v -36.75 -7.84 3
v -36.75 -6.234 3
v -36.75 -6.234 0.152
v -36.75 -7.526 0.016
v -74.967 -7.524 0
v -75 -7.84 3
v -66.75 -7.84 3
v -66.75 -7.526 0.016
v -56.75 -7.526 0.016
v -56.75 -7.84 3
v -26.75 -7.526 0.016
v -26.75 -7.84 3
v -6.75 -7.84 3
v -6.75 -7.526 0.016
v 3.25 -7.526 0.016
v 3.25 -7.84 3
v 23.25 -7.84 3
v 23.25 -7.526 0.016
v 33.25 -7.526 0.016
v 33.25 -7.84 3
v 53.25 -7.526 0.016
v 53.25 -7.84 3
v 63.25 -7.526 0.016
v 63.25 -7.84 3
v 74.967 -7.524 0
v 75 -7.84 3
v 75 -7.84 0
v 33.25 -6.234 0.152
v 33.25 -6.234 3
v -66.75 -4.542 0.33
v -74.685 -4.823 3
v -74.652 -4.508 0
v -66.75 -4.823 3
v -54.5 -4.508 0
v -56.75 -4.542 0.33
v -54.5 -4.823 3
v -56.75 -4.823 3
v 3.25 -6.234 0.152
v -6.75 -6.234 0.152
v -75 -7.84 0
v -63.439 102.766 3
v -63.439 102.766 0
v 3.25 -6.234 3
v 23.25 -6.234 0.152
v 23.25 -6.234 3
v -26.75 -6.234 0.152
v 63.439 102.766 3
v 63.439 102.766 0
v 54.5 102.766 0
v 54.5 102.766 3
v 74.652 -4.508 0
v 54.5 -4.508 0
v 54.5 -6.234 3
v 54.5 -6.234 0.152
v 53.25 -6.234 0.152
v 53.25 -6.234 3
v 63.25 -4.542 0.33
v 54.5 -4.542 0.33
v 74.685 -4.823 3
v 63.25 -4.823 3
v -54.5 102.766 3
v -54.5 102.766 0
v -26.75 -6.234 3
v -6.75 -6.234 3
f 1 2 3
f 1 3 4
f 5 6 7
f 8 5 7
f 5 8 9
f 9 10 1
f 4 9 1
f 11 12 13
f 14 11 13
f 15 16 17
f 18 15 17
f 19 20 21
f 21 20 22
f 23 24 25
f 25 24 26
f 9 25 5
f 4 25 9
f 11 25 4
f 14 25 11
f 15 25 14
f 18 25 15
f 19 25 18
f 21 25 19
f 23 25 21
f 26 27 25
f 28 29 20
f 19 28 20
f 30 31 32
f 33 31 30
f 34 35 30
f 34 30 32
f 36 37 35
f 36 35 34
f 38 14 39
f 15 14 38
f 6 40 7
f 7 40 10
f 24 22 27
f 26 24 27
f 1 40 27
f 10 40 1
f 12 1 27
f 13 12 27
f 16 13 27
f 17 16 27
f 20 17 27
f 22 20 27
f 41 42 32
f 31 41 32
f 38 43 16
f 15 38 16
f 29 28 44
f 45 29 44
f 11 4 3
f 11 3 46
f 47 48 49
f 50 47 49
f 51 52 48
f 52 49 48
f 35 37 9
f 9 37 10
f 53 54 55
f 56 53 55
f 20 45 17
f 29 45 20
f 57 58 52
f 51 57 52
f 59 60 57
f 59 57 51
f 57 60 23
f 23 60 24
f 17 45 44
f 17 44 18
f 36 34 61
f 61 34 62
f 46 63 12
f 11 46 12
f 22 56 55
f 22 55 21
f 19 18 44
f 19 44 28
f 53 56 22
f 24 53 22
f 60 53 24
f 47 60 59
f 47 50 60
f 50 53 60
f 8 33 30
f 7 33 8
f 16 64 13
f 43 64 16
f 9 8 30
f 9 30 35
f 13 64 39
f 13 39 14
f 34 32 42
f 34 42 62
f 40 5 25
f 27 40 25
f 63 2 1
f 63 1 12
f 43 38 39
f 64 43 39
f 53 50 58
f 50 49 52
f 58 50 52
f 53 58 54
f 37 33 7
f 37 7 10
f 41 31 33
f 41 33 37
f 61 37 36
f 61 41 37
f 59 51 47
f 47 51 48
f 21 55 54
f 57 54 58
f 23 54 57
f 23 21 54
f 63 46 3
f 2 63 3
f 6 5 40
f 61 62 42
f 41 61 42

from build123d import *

# Parameters (mm, degrees)
BOSS_EXTRUDE1_DEPTH = 3
CAVITY1_START       = -3.803030659
CAVITY1_OUTLINE_W   = 20
CAVITY1_OUTLINE_H   = 3
CAVITY1_OUTLINE_W_2 = 12.749963879
CAVITY1_OUTLINE_W_3 = 9.250036121
CAVITY1_DEPTH       = 3.331837545
CAVITY1_START_2     = -0.803030659
CAVITY1_2_OUTLINE_W = 10
CAVITY1_2_OUTLINE_H = 3
CAVITY1_2_DEPTH     = 0.331837545


# Read off the part's stored shape, not the designer's step: Cavity1
with BuildPart() as part:
    # Sketch3 → Boss-Extrude1 (new body)
    with BuildSketch(Plane.XY):
        Polygon((-63.438534121, 102.766276007), (-75, -7.839634745), (75, -7.839634745), (63.438534121, 102.766276007), (54.5, 102.766276007), (54.5, -6.233723993), (-54.5, -6.233723993), (-54.5, 102.766276007), align=None)
    extrude(amount=BOSS_EXTRUDE1_DEPTH)

    # Cavity1 outline → Cavity1 (cut)
    with BuildSketch(Plane(origin=(0, 0, 0), x_dir=(1, 0, 0), z_dir=(0, 0.10452846326765304, -0.9945218953682734)).offset(CAVITY1_START)):
        with Locations((43.250036121, 5.983103016)):
            Rectangle(CAVITY1_OUTLINE_W, CAVITY1_OUTLINE_H)
        with Locations((13.250036121, 5.983103016)):
            Rectangle(CAVITY1_OUTLINE_W, CAVITY1_OUTLINE_H)
        with Locations((69.62501806, 5.983103016)):
            Rectangle(CAVITY1_OUTLINE_W_2, CAVITY1_OUTLINE_H)
        with Locations((-16.749963879, 5.983103016)):
            Rectangle(CAVITY1_OUTLINE_W, CAVITY1_OUTLINE_H)
        with Locations((-46.749963879, 5.983103016)):
            Rectangle(CAVITY1_OUTLINE_W, CAVITY1_OUTLINE_H)
        with Locations((-71.37498194, 5.983103016)):
            Rectangle(CAVITY1_OUTLINE_W_3, CAVITY1_OUTLINE_H)
    extrude(amount=CAVITY1_DEPTH, mode=Mode.SUBTRACT)

    # Cavity1 2 outline → Cavity1 2 (cut)
    with BuildSketch(Plane(origin=(0, 0, 0), x_dir=(1, 0, 0), z_dir=(0, 0.10452846326765304, -0.9945218953682734)).offset(CAVITY1_START_2)):
        with Locations((28.250036121, 5.983103016)):
            Rectangle(CAVITY1_2_OUTLINE_W, CAVITY1_2_OUTLINE_H)
        with Locations((58.250036121, 5.983103016)):
            Rectangle(CAVITY1_2_OUTLINE_W, CAVITY1_2_OUTLINE_H)
        with Locations((-1.749963879, 5.983103016)):
            Rectangle(CAVITY1_2_OUTLINE_W, CAVITY1_2_OUTLINE_H)
        with Locations((-31.749963879, 5.983103016)):
            Rectangle(CAVITY1_2_OUTLINE_W, CAVITY1_2_OUTLINE_H)
        with Locations((-61.749963879, 5.983103016)):
            Rectangle(CAVITY1_2_OUTLINE_W, CAVITY1_2_OUTLINE_H)
    extrude(amount=CAVITY1_2_DEPTH, mode=Mode.SUBTRACT)


solid = part.part
